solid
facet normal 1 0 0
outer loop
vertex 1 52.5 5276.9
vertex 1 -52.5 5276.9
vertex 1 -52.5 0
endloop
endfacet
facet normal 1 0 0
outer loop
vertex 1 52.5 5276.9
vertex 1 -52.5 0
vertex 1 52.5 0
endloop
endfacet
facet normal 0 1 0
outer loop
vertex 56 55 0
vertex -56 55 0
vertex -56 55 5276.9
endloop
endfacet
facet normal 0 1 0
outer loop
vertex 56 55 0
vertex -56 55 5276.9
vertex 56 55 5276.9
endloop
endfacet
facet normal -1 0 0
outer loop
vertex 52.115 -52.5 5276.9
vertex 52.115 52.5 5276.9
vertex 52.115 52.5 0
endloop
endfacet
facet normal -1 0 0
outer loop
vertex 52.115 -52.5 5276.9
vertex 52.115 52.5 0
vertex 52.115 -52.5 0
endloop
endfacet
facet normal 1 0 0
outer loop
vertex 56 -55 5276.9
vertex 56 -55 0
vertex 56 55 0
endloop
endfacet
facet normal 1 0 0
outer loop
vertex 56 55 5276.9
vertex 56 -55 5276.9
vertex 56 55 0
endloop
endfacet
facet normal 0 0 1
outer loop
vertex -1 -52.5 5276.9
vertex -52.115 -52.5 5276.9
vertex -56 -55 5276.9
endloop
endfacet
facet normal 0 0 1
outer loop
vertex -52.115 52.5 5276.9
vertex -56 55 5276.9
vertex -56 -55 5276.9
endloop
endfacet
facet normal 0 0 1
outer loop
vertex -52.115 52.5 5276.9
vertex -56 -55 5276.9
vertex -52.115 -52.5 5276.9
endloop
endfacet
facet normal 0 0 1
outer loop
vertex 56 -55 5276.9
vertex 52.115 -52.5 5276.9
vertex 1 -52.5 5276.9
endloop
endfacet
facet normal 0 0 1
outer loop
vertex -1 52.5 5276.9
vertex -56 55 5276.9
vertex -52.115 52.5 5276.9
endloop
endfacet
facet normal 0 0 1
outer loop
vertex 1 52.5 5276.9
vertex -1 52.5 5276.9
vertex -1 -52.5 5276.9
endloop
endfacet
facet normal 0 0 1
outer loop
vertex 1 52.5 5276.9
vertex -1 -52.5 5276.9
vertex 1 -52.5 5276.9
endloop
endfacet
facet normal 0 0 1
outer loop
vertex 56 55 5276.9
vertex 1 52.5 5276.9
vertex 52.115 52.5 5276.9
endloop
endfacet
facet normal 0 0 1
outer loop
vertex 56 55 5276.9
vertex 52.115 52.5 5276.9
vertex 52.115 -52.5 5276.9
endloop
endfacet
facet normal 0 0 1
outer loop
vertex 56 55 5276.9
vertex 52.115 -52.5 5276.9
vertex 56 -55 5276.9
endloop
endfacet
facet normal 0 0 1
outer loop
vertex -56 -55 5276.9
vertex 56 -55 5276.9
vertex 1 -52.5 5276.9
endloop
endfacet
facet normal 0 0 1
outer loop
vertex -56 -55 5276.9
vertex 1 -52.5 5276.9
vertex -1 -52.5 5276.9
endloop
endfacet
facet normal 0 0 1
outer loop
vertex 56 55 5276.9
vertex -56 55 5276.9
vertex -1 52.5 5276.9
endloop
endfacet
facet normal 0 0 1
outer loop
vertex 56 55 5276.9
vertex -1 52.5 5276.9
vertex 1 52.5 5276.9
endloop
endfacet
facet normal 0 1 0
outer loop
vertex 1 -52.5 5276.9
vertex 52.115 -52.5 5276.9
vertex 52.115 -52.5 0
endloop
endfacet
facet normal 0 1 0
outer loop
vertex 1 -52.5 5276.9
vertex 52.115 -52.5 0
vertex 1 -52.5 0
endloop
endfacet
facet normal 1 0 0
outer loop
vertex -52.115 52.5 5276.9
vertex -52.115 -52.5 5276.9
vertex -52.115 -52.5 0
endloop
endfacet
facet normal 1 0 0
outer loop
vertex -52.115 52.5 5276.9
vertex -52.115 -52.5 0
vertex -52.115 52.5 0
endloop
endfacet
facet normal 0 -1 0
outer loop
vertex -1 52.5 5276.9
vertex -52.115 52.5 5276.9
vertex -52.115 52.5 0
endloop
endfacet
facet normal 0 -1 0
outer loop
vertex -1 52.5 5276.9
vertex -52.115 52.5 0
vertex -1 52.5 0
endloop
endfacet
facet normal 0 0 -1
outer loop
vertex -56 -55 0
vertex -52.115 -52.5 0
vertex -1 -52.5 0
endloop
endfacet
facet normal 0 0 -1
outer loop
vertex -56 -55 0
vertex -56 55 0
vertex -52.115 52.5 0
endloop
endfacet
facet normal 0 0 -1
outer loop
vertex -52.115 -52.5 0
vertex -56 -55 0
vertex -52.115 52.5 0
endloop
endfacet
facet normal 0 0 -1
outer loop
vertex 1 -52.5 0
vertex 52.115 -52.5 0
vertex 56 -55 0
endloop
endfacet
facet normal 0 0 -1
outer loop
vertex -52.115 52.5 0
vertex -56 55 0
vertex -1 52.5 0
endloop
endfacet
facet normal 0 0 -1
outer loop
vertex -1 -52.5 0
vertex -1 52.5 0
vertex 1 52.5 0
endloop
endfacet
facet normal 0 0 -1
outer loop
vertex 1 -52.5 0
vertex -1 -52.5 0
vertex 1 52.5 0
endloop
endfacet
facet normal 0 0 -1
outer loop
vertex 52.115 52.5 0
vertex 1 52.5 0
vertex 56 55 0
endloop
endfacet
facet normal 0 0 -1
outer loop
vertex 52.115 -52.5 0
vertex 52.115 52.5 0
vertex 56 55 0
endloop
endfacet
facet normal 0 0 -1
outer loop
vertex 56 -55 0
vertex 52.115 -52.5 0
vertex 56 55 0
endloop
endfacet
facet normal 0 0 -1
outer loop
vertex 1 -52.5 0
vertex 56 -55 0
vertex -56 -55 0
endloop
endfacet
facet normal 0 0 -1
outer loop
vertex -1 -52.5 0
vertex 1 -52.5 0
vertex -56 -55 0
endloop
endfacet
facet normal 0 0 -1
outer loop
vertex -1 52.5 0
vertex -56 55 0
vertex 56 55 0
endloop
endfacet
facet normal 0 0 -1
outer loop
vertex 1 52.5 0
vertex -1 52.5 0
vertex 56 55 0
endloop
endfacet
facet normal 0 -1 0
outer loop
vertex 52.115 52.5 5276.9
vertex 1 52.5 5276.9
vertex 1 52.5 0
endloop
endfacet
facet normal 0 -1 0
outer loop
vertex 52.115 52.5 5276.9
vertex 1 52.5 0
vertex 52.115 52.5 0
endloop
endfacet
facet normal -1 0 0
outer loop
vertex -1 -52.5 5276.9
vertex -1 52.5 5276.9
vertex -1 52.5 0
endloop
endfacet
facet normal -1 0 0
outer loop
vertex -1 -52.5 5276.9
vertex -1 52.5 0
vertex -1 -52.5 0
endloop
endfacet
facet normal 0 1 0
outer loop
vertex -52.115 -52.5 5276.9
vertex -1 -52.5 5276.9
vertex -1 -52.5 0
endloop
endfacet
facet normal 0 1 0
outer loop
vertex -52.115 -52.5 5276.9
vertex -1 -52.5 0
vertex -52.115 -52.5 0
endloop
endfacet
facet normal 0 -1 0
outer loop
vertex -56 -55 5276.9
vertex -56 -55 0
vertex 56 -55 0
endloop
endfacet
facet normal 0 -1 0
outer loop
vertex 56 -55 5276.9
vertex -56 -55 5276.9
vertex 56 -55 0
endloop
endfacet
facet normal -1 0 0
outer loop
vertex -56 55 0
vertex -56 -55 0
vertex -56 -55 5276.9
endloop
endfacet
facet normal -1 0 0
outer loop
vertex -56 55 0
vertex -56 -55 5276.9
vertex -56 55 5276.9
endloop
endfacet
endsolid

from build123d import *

# Parameters (mm, degrees)
F0_W     = 112
F0_H     = 110
F1_DEPTH = 5276.9


with BuildPart() as f1:
    # F0 (on Top) → F1 (new body)
    with BuildSketch(Plane.XY):
        Rectangle(F0_W, F0_H)
        Polygon((-52.1153882146, -52.5), (-52.1153882146, 52.5), (-1, 52.5), (1, 52.5), (52.1153882146, 52.5), (52.1153882146, -52.5), (1, -52.5), (0, -52.5), (-1, -52.5), align=None, mode=Mode.SUBTRACT)
        Polygon((1, 52.5), (-1, 52.5), (-1, -52.5), (0, -52.5), (1, -52.5), align=None)
    extrude(amount=F1_DEPTH)


solid = f1.part
